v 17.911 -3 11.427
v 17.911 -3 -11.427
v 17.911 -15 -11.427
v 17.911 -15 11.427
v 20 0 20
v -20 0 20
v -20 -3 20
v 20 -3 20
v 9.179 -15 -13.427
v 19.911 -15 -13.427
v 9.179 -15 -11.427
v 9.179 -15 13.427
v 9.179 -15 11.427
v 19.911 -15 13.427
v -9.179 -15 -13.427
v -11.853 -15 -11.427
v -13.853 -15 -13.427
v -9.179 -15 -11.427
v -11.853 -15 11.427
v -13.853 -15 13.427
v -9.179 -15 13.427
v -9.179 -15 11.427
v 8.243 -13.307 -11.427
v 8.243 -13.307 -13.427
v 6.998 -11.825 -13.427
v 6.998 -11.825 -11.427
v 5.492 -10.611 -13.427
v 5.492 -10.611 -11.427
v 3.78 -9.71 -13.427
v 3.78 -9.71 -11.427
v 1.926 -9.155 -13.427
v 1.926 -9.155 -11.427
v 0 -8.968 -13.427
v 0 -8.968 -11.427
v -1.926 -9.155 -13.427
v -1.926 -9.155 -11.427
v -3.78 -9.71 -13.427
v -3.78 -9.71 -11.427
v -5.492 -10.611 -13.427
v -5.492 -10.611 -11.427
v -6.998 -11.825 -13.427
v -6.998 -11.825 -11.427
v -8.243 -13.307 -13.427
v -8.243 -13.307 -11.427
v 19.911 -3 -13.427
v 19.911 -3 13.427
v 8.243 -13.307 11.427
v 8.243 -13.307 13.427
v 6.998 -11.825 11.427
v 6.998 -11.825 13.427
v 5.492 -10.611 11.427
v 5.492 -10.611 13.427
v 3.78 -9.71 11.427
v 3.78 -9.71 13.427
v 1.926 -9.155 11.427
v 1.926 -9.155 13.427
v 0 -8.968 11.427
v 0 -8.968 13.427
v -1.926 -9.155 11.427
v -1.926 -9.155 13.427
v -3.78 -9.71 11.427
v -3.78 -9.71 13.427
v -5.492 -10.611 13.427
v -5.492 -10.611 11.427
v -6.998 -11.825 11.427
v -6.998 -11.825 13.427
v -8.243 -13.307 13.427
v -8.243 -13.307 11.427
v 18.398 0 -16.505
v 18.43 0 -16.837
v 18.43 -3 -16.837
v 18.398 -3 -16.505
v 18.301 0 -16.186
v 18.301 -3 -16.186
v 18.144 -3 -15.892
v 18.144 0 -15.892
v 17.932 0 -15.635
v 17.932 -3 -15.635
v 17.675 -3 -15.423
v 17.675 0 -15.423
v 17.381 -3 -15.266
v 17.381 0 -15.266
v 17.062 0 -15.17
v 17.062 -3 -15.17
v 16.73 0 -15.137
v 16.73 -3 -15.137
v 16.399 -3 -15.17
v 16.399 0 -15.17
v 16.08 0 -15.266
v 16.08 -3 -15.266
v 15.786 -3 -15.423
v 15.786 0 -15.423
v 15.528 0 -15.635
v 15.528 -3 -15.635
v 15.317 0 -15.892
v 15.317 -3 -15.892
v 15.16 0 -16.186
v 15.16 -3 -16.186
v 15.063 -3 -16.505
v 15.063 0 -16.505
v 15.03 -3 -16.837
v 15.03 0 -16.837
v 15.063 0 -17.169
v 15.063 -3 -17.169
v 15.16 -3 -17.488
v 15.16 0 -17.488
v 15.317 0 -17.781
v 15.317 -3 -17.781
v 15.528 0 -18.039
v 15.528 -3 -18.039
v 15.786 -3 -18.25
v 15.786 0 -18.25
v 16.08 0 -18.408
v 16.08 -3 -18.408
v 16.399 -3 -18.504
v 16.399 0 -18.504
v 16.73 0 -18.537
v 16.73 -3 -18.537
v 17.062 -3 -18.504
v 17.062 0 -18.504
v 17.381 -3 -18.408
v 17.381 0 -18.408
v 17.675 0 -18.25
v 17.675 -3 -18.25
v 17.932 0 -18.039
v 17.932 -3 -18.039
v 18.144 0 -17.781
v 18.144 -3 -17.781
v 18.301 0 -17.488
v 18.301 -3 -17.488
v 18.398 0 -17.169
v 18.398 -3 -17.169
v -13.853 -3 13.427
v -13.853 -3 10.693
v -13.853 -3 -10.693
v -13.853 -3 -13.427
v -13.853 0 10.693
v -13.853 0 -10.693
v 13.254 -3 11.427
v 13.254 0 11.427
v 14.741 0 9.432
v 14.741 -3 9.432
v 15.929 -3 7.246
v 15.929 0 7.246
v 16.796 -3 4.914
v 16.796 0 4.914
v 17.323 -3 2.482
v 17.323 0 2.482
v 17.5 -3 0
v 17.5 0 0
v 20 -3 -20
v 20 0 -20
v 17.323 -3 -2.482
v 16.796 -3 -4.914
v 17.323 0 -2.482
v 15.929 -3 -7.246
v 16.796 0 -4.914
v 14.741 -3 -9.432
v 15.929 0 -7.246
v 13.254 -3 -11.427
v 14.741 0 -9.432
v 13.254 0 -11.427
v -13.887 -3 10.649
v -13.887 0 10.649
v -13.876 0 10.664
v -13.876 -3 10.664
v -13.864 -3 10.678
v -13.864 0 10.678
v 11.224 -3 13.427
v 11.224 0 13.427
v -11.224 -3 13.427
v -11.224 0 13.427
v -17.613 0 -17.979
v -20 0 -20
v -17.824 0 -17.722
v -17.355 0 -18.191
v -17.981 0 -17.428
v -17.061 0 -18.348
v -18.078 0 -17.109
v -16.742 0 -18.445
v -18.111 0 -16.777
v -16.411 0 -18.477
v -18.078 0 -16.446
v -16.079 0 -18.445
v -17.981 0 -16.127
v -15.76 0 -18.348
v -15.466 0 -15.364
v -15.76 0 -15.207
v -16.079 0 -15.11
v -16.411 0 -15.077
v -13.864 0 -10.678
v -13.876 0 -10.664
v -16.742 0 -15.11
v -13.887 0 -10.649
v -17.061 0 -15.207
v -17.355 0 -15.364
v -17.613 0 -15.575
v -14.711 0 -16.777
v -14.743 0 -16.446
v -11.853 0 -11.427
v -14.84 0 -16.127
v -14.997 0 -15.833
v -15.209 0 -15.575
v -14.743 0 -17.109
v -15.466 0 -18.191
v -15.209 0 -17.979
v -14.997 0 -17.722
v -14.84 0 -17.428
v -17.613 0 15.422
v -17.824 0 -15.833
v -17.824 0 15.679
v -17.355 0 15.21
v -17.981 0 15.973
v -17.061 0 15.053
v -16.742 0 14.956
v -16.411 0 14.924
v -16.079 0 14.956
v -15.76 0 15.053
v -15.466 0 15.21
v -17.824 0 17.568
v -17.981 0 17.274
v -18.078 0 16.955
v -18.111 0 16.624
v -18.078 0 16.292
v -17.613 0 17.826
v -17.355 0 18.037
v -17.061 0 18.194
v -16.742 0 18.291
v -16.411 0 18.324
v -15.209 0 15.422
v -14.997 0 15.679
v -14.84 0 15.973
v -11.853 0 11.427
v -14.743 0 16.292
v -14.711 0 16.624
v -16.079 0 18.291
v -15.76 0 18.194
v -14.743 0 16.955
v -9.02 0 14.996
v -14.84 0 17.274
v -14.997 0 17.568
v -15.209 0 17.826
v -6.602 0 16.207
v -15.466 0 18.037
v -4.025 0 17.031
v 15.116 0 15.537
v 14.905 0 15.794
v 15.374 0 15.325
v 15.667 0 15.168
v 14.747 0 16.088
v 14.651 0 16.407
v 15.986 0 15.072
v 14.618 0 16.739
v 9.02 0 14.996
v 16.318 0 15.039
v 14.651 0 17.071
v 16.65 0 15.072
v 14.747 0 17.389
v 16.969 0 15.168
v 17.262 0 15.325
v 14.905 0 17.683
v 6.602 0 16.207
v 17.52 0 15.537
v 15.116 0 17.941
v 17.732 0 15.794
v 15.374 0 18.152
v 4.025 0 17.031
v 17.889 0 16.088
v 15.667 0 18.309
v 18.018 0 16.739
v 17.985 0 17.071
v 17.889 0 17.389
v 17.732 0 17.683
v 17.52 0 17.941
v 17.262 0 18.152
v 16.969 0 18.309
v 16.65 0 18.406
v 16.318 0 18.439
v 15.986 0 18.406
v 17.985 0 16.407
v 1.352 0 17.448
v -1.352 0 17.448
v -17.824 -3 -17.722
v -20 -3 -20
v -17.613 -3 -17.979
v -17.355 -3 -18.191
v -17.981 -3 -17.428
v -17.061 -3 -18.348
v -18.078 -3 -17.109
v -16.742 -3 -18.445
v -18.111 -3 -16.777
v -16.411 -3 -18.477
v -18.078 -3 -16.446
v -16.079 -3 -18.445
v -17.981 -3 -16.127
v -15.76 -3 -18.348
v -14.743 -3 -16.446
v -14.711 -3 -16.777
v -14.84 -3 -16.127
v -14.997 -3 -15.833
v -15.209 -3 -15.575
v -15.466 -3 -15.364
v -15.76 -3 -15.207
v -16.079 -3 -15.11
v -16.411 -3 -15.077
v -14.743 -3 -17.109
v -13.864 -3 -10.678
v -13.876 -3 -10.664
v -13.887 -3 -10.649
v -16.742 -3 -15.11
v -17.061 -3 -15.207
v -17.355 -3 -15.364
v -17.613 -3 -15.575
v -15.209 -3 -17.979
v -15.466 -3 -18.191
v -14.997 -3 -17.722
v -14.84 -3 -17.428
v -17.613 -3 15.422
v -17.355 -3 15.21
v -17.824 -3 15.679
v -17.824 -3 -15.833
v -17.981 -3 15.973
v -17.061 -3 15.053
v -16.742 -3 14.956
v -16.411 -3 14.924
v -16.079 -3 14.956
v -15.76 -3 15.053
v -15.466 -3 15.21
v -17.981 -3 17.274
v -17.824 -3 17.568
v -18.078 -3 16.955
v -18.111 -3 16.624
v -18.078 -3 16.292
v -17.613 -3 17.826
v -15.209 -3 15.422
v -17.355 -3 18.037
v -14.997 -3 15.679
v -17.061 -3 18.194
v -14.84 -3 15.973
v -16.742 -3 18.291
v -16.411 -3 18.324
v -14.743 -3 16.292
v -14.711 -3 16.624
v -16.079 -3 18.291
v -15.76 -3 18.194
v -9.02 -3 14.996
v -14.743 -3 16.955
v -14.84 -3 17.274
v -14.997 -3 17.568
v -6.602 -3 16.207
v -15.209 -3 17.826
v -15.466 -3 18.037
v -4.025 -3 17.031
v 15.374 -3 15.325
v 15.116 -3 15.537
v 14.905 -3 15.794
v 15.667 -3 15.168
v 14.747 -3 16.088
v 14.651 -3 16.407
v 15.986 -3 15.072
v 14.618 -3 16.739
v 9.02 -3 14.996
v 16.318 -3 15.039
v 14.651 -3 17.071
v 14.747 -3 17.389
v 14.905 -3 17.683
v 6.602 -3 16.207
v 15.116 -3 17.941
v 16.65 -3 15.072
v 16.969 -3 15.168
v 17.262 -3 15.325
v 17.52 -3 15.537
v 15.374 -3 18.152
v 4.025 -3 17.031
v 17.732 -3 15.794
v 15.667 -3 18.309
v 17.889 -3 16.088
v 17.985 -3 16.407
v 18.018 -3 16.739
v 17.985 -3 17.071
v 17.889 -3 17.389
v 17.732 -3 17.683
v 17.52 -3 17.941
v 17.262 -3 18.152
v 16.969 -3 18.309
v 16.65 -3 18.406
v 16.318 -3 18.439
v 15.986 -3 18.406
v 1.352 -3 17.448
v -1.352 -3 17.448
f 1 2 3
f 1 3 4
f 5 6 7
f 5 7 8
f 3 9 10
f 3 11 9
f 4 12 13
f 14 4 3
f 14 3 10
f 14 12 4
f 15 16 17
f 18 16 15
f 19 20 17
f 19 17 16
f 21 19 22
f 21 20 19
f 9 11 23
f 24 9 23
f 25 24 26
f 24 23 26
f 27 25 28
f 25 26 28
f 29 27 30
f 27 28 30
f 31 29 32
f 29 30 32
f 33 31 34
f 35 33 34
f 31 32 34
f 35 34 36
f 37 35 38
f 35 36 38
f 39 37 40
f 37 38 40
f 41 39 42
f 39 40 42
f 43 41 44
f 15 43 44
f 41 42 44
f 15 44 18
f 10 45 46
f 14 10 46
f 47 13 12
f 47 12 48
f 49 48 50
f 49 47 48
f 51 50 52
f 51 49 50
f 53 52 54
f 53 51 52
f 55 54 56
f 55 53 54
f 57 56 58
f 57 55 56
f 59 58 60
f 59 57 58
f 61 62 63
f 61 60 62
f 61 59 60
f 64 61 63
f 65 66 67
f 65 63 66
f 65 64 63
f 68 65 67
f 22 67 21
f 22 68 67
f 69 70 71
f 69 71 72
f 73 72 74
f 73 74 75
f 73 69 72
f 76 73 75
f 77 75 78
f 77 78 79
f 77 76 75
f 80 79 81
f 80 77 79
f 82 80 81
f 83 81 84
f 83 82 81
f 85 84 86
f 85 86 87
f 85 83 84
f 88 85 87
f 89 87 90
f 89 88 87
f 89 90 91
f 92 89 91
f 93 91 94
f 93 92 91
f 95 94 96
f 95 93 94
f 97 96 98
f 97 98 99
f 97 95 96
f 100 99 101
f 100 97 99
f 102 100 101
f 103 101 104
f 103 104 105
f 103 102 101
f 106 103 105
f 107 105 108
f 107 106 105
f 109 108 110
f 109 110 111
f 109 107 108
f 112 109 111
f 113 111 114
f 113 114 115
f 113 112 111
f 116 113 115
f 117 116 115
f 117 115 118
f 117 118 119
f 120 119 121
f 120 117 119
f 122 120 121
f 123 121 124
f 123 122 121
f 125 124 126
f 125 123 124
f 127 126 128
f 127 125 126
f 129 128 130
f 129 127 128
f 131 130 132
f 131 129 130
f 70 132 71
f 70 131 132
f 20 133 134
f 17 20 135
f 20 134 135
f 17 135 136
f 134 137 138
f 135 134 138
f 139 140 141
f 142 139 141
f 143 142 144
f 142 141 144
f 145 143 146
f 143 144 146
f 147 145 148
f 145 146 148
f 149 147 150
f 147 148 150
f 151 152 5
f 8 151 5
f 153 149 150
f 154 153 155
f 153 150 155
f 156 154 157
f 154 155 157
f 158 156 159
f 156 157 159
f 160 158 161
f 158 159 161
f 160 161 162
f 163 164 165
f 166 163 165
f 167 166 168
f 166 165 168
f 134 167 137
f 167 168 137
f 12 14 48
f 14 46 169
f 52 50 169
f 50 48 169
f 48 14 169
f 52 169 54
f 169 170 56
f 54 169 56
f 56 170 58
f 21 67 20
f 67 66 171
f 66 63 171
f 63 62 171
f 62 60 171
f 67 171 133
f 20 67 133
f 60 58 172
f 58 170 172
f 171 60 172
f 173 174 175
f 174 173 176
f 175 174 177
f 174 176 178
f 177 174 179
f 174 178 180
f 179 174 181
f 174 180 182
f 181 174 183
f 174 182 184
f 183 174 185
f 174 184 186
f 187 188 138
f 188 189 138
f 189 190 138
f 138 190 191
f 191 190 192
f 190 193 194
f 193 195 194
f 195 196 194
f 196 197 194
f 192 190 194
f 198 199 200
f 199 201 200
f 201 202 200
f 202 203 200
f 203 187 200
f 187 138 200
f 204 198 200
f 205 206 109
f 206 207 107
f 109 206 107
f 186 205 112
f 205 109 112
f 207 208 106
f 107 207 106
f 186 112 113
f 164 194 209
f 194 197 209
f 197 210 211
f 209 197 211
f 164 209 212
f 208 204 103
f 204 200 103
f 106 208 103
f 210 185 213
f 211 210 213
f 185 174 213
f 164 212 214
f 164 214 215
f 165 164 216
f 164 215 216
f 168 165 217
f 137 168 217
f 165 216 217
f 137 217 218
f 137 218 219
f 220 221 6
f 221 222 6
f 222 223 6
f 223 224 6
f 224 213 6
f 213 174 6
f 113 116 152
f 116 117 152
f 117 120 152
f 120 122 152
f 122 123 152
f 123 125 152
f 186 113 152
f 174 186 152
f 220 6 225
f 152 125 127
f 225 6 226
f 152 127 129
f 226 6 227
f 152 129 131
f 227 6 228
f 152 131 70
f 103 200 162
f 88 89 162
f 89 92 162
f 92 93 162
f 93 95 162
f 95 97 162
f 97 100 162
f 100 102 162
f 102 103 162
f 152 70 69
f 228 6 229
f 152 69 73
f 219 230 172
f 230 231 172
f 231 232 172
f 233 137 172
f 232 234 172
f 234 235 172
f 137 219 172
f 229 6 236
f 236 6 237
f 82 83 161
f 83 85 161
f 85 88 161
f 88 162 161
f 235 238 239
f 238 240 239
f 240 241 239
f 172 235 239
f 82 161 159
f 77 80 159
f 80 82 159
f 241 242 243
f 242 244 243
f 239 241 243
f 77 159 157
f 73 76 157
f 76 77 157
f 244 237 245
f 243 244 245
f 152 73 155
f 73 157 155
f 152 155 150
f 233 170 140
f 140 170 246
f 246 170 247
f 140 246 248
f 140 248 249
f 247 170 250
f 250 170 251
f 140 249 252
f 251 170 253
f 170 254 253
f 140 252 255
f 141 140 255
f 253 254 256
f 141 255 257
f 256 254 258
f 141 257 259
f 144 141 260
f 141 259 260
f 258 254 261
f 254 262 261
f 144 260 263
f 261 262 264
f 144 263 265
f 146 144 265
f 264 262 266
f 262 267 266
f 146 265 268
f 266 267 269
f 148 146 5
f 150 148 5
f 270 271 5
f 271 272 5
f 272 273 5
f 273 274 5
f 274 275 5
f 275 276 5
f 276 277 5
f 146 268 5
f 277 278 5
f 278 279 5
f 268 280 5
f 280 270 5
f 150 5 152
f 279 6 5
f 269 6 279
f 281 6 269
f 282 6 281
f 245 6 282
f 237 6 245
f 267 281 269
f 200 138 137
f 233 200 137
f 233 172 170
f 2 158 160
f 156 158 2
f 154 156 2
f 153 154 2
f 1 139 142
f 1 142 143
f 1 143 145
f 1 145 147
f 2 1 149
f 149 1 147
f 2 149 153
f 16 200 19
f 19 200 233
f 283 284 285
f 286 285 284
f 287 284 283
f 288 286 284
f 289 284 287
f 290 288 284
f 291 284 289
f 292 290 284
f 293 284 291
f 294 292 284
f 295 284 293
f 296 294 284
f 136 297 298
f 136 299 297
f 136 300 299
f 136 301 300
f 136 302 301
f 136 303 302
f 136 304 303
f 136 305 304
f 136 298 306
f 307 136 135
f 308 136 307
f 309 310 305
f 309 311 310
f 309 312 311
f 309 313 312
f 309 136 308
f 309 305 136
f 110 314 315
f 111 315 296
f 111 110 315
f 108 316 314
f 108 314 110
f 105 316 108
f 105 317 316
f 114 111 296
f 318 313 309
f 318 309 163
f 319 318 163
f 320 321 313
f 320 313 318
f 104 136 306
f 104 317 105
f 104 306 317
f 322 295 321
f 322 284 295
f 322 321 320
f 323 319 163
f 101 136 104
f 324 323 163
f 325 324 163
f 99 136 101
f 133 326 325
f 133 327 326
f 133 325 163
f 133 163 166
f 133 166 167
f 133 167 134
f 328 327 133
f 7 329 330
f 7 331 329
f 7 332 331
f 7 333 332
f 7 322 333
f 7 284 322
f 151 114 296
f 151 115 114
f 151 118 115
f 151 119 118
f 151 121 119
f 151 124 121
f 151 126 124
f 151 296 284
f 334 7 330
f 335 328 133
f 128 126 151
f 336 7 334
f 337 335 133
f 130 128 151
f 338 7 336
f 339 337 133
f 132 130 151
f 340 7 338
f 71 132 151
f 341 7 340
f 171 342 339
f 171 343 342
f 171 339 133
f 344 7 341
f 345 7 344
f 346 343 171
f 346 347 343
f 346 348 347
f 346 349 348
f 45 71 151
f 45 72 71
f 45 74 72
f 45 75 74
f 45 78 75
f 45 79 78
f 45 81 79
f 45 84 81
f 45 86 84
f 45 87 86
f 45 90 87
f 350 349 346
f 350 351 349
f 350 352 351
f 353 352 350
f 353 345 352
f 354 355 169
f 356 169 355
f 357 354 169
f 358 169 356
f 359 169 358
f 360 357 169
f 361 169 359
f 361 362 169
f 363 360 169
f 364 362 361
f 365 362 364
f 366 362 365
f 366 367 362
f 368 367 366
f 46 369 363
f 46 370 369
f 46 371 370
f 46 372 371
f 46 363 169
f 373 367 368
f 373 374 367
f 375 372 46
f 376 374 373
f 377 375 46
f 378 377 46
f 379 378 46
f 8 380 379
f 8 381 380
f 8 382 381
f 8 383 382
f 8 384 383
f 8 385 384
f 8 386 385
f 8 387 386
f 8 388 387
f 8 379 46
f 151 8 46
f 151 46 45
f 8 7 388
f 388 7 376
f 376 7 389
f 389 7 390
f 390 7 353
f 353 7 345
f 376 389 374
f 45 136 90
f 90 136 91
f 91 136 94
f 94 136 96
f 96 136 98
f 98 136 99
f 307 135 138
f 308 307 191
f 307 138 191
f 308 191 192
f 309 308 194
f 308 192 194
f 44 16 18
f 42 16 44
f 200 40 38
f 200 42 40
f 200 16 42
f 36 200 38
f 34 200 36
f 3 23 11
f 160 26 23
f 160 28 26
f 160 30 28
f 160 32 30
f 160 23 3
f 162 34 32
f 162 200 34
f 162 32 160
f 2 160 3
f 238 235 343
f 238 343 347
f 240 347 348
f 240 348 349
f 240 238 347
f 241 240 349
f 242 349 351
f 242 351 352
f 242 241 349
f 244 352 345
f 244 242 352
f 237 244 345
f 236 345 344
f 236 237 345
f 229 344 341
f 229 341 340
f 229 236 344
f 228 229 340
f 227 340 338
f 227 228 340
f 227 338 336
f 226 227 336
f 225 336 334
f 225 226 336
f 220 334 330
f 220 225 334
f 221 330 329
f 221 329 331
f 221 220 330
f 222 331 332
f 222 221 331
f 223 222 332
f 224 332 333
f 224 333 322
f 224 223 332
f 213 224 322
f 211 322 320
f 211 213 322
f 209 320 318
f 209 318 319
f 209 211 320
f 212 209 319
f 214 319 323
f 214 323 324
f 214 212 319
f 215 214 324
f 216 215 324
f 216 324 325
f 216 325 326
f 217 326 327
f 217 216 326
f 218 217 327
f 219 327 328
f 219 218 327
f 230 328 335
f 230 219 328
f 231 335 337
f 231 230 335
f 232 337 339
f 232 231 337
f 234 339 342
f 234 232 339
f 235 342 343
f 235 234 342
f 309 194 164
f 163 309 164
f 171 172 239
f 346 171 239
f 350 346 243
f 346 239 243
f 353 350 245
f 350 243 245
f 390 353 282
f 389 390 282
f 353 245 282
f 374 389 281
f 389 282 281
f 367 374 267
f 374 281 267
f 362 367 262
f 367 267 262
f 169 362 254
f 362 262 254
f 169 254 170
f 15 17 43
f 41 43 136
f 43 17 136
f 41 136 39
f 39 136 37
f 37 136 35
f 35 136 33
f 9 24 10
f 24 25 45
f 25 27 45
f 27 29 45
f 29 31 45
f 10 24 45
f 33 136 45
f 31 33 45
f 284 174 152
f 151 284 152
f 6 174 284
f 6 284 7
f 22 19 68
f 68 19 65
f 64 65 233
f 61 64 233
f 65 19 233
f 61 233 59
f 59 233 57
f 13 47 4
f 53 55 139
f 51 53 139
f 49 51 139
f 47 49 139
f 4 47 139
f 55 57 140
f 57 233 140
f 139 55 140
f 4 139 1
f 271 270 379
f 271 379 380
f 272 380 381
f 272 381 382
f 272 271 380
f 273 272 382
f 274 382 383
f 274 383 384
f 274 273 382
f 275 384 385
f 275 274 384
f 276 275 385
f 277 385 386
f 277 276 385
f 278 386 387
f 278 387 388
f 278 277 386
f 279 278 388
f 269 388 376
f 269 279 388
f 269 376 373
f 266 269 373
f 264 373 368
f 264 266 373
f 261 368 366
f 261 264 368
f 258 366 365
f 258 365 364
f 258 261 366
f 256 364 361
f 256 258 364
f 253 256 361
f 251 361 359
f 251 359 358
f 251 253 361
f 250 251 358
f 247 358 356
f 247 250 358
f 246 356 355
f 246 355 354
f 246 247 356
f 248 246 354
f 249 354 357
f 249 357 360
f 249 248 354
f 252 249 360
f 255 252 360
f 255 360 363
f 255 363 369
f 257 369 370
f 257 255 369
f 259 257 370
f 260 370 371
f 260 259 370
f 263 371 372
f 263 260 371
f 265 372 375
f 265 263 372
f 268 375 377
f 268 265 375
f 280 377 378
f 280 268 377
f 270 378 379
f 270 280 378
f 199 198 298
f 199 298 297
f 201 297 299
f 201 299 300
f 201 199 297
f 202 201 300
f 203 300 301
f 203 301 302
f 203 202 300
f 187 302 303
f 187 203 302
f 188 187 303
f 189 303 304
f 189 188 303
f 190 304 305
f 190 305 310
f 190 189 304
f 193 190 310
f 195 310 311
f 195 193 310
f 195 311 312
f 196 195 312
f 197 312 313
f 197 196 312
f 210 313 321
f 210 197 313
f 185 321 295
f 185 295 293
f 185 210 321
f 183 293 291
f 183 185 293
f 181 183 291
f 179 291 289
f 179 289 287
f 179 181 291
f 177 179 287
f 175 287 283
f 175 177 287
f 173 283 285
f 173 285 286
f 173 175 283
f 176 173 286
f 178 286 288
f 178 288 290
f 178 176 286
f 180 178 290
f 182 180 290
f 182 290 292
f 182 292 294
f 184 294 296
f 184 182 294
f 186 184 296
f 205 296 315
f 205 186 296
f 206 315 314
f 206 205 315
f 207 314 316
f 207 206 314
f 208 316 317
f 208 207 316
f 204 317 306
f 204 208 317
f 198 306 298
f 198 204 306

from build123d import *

# Parameters (mm, degrees)
F1_W          = 40
F1_H          = 40
F1_R          = 1.7
F2_DEPTH      = 3
F0_W          = 29.764212
F0_H          = 22.853858
F3_DEPTH      = 15
F0_W_2        = 24.935725
F0_H_2        = 6.393774
F4_DEPTH      = 3
F5_R          = 10
F7_DEPTH      = 25
F7_DEPTH_BACK = 25


with BuildPart() as f2:
    # F1 (on Front) → F2 (new body)
    with BuildSketch(Plane.XZ):
        Rectangle(F1_W, F1_H)
        with Locations((-16.410692, -16.77718)):
            Circle(F1_R, mode=Mode.SUBTRACT)
        with Locations((16.730379, -16.836943)):
            Circle(F1_R, mode=Mode.SUBTRACT)
        with Locations((-16.410692, 16.623817)):
            Circle(F1_R, mode=Mode.SUBTRACT)
        with BuildLine():
            ThreePointArc((-13.886995, 10.649008), (5.622615, 16.572151), (17.5, 0))
            ThreePointArc((17.5, 0), (5.622615, -16.572151), (-13.886995, -10.649008))
            ThreePointArc((-13.886995, -10.649008), (-17.5, 0), (-13.886995, 10.649008))
        make_face(mode=Mode.SUBTRACT)
        with Locations((16.31801, 16.738871)):
            Circle(F1_R, mode=Mode.SUBTRACT)
        with BuildLine():
            Line((-13.886995, -10.649008), (-13.886995, 10.649008))
            ThreePointArc((-13.886995, 10.649008), (-17.5, 0), (-13.886995, -10.649008))
        make_face()
    extrude(amount=F2_DEPTH)

    # F0 (on Front) → F3 (join)
    with BuildSketch(Plane.XZ):
        Polygon((19.911033, 13.426929), (-13.853179, 13.426929), (-13.853179, -13.426929), (-12.467862, -13.426929), (12.467863, -13.426929), (19.911033, -13.426929), align=None)
        with Locations((3.028927, 0)):
            Rectangle(F0_W, F0_H, mode=Mode.SUBTRACT)
    extrude(amount=F3_DEPTH)

    # F0 (on Front) → F4 (join)
    with BuildSketch(Plane.XZ):
        with Locations((0, -16.623816)):
            Rectangle(F0_W_2, F0_H_2)
    extrude(amount=F4_DEPTH)

    # F5 (on Top) → F7 (cut, two sides)
    with BuildSketch(Plane.XY) as f7_sk:
        with Locations((0, -18.9682)):
            Circle(F5_R)
    extrude(amount=F7_DEPTH, mode=Mode.SUBTRACT)
    extrude(f7_sk.sketch, amount=-F7_DEPTH_BACK, mode=Mode.SUBTRACT)


solid = f2.part
